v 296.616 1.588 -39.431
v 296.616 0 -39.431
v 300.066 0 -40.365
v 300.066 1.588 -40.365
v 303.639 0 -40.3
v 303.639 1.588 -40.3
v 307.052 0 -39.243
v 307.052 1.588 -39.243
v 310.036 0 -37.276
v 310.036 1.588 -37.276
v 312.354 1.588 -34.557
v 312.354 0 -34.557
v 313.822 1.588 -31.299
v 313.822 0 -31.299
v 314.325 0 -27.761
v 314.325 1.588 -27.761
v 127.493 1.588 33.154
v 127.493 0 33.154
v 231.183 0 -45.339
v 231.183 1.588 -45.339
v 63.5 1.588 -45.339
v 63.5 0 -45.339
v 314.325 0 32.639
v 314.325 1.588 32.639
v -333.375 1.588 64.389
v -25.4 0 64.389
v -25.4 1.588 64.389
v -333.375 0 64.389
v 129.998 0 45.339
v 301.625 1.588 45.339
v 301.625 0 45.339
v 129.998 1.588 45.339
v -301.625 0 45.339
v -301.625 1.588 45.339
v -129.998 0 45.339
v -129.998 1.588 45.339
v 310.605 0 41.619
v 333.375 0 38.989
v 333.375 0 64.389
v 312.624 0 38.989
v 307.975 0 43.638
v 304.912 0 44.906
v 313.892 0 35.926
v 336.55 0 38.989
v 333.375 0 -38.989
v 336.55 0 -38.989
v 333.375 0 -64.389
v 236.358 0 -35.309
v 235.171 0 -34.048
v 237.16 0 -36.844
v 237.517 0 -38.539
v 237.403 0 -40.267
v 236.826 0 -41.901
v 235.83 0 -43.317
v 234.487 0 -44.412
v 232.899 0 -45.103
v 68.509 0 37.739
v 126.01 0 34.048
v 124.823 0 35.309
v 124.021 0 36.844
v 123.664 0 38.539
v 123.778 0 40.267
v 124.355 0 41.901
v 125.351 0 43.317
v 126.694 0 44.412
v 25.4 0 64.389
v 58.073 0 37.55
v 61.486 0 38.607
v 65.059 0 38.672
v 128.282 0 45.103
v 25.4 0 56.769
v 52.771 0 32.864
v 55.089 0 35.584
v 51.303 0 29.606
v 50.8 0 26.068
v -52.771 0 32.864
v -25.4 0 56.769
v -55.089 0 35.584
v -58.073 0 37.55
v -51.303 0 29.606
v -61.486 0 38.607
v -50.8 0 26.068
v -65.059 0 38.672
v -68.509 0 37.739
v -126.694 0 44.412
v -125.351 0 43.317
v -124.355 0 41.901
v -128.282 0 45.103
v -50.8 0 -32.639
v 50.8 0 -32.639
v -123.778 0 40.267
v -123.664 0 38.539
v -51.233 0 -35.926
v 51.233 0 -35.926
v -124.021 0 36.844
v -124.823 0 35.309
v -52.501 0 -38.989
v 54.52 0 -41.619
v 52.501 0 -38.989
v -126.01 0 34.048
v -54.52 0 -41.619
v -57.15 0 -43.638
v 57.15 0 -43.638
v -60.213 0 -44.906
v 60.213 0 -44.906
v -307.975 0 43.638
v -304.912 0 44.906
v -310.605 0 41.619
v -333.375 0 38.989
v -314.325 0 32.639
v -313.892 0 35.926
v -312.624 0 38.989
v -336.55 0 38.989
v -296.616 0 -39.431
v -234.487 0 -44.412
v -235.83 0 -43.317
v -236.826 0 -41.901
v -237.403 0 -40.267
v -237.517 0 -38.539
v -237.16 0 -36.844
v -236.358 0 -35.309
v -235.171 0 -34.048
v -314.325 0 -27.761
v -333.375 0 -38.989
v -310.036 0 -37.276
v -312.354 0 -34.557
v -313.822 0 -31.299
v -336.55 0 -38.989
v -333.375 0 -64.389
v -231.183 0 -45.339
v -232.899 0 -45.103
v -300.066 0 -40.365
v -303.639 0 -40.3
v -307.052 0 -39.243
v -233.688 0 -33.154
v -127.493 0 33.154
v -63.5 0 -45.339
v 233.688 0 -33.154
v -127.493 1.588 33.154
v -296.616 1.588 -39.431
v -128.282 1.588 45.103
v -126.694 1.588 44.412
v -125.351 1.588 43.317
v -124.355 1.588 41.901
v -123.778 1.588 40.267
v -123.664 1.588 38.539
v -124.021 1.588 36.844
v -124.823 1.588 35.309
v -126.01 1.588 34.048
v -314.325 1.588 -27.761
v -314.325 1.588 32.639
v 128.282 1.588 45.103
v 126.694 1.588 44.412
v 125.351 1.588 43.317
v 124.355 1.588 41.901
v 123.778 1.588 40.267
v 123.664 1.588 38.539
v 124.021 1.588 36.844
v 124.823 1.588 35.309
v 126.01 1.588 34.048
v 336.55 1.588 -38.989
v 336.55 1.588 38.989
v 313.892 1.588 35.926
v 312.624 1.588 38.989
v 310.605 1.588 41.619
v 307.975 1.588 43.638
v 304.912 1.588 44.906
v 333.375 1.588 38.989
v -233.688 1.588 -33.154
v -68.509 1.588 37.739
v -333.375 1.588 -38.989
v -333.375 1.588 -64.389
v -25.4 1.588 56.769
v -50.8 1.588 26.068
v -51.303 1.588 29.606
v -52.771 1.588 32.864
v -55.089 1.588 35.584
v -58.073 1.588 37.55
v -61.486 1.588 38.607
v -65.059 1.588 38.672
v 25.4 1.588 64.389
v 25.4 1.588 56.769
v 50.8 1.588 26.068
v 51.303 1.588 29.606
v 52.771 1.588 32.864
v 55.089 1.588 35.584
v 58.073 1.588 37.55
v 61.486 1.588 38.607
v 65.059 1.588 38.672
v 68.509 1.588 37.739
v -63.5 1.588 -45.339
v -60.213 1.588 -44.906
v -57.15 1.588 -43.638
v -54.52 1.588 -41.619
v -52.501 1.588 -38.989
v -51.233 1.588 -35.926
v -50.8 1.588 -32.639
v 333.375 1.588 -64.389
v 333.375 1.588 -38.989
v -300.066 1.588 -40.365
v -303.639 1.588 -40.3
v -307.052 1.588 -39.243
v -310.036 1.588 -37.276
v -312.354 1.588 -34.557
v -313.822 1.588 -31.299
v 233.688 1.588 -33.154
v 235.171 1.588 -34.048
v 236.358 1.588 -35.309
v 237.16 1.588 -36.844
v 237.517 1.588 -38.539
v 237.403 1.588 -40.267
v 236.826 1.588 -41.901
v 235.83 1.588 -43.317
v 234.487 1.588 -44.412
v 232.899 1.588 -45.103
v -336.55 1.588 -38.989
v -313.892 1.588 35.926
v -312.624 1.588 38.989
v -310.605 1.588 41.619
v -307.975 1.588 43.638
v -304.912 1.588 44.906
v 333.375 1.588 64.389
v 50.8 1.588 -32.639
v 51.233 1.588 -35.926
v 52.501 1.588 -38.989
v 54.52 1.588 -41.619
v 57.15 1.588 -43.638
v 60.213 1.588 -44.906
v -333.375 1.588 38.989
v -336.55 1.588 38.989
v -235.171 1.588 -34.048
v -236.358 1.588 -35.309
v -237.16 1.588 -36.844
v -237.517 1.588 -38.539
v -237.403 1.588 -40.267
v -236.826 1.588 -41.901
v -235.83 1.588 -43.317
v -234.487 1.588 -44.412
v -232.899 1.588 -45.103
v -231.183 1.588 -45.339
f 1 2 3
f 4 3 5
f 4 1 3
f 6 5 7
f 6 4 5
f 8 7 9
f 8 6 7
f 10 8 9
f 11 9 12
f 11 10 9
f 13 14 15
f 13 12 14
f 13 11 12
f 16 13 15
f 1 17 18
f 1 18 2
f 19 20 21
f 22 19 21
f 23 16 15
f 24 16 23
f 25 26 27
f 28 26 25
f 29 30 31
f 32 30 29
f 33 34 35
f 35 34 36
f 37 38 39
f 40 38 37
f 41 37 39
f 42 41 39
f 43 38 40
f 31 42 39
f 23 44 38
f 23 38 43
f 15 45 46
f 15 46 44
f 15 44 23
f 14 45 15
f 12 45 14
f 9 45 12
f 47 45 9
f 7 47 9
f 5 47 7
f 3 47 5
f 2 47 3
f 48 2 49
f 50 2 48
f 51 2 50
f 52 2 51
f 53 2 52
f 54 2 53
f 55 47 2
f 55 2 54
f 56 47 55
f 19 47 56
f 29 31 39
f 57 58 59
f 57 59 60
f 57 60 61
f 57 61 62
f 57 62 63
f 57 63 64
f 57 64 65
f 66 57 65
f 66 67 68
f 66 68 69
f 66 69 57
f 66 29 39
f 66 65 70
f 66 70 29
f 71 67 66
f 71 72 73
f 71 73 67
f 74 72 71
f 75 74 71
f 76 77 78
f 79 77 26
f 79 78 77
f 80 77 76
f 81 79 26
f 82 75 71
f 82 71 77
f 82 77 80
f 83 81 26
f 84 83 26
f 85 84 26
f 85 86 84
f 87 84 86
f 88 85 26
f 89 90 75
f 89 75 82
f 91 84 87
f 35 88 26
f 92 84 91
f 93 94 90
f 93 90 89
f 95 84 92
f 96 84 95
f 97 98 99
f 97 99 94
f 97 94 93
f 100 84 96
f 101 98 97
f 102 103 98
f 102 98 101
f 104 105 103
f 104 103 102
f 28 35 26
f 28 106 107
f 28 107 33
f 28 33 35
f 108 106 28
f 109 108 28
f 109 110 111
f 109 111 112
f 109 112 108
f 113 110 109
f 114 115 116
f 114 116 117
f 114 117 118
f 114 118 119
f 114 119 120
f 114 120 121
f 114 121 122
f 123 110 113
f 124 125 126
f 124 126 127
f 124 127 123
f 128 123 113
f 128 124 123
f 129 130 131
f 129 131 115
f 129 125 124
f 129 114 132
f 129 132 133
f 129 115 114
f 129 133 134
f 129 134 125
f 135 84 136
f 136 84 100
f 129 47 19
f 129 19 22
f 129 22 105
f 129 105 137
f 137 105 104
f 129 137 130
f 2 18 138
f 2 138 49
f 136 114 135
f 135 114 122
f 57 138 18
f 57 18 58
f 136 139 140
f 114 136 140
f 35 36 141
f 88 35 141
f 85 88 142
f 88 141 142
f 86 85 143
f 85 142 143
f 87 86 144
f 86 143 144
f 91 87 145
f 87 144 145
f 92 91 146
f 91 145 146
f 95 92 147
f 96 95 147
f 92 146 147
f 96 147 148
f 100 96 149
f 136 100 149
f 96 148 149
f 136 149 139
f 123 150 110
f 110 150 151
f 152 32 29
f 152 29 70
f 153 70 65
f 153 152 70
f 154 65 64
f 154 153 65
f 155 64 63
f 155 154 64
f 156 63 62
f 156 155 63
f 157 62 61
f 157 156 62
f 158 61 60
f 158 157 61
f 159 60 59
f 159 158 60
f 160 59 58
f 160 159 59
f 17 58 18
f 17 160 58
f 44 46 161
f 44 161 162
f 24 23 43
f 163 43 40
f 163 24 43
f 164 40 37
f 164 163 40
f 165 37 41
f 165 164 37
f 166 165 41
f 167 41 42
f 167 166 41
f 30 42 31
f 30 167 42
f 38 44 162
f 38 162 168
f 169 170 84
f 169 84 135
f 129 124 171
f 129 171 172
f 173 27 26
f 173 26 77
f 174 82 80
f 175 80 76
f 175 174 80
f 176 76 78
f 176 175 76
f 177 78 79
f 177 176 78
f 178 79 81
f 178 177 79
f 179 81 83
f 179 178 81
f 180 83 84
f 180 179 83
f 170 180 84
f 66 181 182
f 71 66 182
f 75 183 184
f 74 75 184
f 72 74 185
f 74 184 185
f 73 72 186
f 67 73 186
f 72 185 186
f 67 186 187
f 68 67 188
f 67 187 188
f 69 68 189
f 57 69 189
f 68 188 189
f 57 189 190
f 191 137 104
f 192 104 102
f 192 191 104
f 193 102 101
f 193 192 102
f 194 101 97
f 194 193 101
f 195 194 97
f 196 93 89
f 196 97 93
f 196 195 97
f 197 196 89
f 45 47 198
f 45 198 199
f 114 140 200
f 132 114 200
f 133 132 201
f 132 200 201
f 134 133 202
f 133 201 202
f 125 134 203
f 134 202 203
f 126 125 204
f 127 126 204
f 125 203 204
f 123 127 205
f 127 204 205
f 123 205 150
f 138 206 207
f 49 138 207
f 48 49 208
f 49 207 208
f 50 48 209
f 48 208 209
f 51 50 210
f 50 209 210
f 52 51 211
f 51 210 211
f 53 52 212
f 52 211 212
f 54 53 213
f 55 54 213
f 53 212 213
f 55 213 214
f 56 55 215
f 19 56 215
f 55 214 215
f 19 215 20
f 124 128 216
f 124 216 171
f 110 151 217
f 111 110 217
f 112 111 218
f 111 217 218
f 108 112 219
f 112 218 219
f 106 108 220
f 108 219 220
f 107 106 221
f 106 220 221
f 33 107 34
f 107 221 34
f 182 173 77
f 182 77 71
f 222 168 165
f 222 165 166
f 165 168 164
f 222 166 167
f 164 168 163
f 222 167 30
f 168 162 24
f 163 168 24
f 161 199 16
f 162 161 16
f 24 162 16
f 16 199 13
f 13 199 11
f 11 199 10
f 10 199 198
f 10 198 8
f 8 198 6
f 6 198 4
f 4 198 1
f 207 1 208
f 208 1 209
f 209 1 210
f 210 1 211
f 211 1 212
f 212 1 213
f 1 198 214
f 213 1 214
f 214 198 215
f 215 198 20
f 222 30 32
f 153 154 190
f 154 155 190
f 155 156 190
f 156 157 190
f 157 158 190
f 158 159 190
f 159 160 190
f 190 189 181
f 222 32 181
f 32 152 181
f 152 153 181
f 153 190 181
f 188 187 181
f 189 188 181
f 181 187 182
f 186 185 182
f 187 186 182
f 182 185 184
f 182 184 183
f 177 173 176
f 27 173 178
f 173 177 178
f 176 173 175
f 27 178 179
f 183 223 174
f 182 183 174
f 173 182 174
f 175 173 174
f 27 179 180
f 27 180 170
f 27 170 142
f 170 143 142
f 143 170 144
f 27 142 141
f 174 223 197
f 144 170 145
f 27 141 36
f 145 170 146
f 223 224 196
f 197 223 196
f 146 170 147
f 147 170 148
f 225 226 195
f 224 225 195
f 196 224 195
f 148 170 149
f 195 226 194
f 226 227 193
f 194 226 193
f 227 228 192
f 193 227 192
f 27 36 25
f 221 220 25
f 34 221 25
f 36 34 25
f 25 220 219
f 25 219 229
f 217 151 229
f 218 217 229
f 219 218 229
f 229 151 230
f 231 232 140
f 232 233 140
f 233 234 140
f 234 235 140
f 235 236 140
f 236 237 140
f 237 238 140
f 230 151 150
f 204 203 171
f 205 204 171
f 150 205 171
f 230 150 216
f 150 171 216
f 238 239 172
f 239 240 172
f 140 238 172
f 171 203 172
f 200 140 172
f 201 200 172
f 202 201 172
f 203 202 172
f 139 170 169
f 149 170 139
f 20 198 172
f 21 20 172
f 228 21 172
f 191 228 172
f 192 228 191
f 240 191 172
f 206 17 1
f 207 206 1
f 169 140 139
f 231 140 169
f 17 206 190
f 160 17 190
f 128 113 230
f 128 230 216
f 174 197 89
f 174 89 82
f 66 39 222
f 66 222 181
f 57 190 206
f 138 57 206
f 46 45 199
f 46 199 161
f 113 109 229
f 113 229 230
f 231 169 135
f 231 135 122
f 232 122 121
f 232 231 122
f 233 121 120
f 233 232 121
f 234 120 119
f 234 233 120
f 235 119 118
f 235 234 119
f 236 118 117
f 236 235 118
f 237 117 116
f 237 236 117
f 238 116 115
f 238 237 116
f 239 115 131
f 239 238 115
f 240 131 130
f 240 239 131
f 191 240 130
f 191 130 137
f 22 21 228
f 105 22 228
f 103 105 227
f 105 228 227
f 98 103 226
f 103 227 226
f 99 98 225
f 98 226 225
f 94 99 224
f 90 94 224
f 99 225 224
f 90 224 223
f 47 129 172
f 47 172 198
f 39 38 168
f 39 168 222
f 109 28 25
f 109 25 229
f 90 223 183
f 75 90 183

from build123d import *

# Parameters (mm, degrees)
BOSS_EXTRUDE1_DEPTH = 1.5875
CUT_EXTRUDE2_DEPTH  = 343.657797193
WING_SPAR_CUT_W     = 50.8
WING_SPAR_CUT_H     = 7.62
CUT_EXTRUDE3_DEPTH  = 343.657797193


with BuildPart() as part:
    # Sketch1 → Boss-Extrude1 (new body)
    with BuildSketch(Plane(origin=(0, 0, 0), x_dir=(1, 0, 0), z_dir=(0, 1, 0))):
        Polygon((-333.375, 38.989), (-333.375, 64.389), (333.375, 64.389), (333.375, 38.989), (336.55, 38.989), (336.55, -38.989), (333.375, -38.989), (333.375, -64.389), (-333.375, -64.389), (-333.375, -38.989), (-336.55, -38.989), (-336.55, 38.989), align=None)
    extrude(amount=BOSS_EXTRUDE1_DEPTH)

    # Sketch3 → Cut-Extrude2 (cut, through all)
    with BuildSketch(Plane(origin=(0, 1.5875, 0), x_dir=(1, 0, 0), z_dir=(0, 1, 0))):
        with BuildLine():
            Line((-314.325, 27.760799149), (-314.325, -32.639))
            ThreePointArc((-314.325, -32.639), (-310.605256121, -41.619256121), (-301.625, -45.339))
            Line((-301.625, -45.339), (-129.997745545, -45.339))
            ThreePointArc((-129.997745545, -45.339), (-123.777758329, -40.267381409), (-127.49333105, -33.153727253))
            Line((-127.49333105, -33.153727253), (-296.616171009, 39.431344643))
            ThreePointArc((-296.616171009, 39.431344643), (-308.613485953, 38.365093755), (-314.325, 27.760799149))
        make_face()
        with BuildLine():
            Line((-231.183231716, 45.339), (-63.5, 45.339))
            ThreePointArc((-63.5, 45.339), (-54.519743879, 41.619256121), (-50.8, 32.639))
            Line((-50.8, 32.639), (-50.8, -26.068081748))
            ThreePointArc((-50.8, -26.068081748), (-56.511514047, -36.672376354), (-68.508828991, -37.738627243))
            Line((-68.508828991, -37.738627243), (-233.687646211, 33.153727253))
            ThreePointArc((-233.687646211, 33.153727253), (-237.403218932, 40.267381409), (-231.183231716, 45.339))
        make_face()
        with BuildLine():
            Line((68.508828991, -37.738627243), (233.687646211, 33.153727253))
            ThreePointArc((233.687646211, 33.153727253), (237.403218932, 40.267381409), (231.183231716, 45.339))
            Line((231.183231716, 45.339), (63.5, 45.339))
            ThreePointArc((63.5, 45.339), (54.519743879, 41.619256121), (50.8, 32.639))
            Line((50.8, 32.639), (50.8, -26.068081748))
            ThreePointArc((50.8, -26.068081748), (56.511514047, -36.672376354), (68.508828991, -37.738627243))
        make_face()
        with BuildLine():
            Line((314.325, 27.760799149), (314.325, -32.639))
            ThreePointArc((314.325, -32.639), (310.605256121, -41.619256121), (301.625, -45.339))
            Line((301.625, -45.339), (129.997745545, -45.339))
            ThreePointArc((129.997745545, -45.339), (123.777758329, -40.267381409), (127.49333105, -33.153727253))
            Line((127.49333105, -33.153727253), (296.616171009, 39.431344643))
            ThreePointArc((296.616171009, 39.431344643), (308.613485953, 38.365093755), (314.325, 27.760799149))
        make_face()
    extrude(amount=-CUT_EXTRUDE2_DEPTH, mode=Mode.SUBTRACT)

    # Wing Spar Cut → Cut-Extrude3 (cut, through all)
    with BuildSketch(Plane(origin=(0, 1.5875, 0), x_dir=(1, 0, 0), z_dir=(0, 1, 0))):
        with Locations((0, -60.579)):
            Rectangle(WING_SPAR_CUT_W, WING_SPAR_CUT_H)
    extrude(amount=-CUT_EXTRUDE3_DEPTH, mode=Mode.SUBTRACT)


solid = part.part
